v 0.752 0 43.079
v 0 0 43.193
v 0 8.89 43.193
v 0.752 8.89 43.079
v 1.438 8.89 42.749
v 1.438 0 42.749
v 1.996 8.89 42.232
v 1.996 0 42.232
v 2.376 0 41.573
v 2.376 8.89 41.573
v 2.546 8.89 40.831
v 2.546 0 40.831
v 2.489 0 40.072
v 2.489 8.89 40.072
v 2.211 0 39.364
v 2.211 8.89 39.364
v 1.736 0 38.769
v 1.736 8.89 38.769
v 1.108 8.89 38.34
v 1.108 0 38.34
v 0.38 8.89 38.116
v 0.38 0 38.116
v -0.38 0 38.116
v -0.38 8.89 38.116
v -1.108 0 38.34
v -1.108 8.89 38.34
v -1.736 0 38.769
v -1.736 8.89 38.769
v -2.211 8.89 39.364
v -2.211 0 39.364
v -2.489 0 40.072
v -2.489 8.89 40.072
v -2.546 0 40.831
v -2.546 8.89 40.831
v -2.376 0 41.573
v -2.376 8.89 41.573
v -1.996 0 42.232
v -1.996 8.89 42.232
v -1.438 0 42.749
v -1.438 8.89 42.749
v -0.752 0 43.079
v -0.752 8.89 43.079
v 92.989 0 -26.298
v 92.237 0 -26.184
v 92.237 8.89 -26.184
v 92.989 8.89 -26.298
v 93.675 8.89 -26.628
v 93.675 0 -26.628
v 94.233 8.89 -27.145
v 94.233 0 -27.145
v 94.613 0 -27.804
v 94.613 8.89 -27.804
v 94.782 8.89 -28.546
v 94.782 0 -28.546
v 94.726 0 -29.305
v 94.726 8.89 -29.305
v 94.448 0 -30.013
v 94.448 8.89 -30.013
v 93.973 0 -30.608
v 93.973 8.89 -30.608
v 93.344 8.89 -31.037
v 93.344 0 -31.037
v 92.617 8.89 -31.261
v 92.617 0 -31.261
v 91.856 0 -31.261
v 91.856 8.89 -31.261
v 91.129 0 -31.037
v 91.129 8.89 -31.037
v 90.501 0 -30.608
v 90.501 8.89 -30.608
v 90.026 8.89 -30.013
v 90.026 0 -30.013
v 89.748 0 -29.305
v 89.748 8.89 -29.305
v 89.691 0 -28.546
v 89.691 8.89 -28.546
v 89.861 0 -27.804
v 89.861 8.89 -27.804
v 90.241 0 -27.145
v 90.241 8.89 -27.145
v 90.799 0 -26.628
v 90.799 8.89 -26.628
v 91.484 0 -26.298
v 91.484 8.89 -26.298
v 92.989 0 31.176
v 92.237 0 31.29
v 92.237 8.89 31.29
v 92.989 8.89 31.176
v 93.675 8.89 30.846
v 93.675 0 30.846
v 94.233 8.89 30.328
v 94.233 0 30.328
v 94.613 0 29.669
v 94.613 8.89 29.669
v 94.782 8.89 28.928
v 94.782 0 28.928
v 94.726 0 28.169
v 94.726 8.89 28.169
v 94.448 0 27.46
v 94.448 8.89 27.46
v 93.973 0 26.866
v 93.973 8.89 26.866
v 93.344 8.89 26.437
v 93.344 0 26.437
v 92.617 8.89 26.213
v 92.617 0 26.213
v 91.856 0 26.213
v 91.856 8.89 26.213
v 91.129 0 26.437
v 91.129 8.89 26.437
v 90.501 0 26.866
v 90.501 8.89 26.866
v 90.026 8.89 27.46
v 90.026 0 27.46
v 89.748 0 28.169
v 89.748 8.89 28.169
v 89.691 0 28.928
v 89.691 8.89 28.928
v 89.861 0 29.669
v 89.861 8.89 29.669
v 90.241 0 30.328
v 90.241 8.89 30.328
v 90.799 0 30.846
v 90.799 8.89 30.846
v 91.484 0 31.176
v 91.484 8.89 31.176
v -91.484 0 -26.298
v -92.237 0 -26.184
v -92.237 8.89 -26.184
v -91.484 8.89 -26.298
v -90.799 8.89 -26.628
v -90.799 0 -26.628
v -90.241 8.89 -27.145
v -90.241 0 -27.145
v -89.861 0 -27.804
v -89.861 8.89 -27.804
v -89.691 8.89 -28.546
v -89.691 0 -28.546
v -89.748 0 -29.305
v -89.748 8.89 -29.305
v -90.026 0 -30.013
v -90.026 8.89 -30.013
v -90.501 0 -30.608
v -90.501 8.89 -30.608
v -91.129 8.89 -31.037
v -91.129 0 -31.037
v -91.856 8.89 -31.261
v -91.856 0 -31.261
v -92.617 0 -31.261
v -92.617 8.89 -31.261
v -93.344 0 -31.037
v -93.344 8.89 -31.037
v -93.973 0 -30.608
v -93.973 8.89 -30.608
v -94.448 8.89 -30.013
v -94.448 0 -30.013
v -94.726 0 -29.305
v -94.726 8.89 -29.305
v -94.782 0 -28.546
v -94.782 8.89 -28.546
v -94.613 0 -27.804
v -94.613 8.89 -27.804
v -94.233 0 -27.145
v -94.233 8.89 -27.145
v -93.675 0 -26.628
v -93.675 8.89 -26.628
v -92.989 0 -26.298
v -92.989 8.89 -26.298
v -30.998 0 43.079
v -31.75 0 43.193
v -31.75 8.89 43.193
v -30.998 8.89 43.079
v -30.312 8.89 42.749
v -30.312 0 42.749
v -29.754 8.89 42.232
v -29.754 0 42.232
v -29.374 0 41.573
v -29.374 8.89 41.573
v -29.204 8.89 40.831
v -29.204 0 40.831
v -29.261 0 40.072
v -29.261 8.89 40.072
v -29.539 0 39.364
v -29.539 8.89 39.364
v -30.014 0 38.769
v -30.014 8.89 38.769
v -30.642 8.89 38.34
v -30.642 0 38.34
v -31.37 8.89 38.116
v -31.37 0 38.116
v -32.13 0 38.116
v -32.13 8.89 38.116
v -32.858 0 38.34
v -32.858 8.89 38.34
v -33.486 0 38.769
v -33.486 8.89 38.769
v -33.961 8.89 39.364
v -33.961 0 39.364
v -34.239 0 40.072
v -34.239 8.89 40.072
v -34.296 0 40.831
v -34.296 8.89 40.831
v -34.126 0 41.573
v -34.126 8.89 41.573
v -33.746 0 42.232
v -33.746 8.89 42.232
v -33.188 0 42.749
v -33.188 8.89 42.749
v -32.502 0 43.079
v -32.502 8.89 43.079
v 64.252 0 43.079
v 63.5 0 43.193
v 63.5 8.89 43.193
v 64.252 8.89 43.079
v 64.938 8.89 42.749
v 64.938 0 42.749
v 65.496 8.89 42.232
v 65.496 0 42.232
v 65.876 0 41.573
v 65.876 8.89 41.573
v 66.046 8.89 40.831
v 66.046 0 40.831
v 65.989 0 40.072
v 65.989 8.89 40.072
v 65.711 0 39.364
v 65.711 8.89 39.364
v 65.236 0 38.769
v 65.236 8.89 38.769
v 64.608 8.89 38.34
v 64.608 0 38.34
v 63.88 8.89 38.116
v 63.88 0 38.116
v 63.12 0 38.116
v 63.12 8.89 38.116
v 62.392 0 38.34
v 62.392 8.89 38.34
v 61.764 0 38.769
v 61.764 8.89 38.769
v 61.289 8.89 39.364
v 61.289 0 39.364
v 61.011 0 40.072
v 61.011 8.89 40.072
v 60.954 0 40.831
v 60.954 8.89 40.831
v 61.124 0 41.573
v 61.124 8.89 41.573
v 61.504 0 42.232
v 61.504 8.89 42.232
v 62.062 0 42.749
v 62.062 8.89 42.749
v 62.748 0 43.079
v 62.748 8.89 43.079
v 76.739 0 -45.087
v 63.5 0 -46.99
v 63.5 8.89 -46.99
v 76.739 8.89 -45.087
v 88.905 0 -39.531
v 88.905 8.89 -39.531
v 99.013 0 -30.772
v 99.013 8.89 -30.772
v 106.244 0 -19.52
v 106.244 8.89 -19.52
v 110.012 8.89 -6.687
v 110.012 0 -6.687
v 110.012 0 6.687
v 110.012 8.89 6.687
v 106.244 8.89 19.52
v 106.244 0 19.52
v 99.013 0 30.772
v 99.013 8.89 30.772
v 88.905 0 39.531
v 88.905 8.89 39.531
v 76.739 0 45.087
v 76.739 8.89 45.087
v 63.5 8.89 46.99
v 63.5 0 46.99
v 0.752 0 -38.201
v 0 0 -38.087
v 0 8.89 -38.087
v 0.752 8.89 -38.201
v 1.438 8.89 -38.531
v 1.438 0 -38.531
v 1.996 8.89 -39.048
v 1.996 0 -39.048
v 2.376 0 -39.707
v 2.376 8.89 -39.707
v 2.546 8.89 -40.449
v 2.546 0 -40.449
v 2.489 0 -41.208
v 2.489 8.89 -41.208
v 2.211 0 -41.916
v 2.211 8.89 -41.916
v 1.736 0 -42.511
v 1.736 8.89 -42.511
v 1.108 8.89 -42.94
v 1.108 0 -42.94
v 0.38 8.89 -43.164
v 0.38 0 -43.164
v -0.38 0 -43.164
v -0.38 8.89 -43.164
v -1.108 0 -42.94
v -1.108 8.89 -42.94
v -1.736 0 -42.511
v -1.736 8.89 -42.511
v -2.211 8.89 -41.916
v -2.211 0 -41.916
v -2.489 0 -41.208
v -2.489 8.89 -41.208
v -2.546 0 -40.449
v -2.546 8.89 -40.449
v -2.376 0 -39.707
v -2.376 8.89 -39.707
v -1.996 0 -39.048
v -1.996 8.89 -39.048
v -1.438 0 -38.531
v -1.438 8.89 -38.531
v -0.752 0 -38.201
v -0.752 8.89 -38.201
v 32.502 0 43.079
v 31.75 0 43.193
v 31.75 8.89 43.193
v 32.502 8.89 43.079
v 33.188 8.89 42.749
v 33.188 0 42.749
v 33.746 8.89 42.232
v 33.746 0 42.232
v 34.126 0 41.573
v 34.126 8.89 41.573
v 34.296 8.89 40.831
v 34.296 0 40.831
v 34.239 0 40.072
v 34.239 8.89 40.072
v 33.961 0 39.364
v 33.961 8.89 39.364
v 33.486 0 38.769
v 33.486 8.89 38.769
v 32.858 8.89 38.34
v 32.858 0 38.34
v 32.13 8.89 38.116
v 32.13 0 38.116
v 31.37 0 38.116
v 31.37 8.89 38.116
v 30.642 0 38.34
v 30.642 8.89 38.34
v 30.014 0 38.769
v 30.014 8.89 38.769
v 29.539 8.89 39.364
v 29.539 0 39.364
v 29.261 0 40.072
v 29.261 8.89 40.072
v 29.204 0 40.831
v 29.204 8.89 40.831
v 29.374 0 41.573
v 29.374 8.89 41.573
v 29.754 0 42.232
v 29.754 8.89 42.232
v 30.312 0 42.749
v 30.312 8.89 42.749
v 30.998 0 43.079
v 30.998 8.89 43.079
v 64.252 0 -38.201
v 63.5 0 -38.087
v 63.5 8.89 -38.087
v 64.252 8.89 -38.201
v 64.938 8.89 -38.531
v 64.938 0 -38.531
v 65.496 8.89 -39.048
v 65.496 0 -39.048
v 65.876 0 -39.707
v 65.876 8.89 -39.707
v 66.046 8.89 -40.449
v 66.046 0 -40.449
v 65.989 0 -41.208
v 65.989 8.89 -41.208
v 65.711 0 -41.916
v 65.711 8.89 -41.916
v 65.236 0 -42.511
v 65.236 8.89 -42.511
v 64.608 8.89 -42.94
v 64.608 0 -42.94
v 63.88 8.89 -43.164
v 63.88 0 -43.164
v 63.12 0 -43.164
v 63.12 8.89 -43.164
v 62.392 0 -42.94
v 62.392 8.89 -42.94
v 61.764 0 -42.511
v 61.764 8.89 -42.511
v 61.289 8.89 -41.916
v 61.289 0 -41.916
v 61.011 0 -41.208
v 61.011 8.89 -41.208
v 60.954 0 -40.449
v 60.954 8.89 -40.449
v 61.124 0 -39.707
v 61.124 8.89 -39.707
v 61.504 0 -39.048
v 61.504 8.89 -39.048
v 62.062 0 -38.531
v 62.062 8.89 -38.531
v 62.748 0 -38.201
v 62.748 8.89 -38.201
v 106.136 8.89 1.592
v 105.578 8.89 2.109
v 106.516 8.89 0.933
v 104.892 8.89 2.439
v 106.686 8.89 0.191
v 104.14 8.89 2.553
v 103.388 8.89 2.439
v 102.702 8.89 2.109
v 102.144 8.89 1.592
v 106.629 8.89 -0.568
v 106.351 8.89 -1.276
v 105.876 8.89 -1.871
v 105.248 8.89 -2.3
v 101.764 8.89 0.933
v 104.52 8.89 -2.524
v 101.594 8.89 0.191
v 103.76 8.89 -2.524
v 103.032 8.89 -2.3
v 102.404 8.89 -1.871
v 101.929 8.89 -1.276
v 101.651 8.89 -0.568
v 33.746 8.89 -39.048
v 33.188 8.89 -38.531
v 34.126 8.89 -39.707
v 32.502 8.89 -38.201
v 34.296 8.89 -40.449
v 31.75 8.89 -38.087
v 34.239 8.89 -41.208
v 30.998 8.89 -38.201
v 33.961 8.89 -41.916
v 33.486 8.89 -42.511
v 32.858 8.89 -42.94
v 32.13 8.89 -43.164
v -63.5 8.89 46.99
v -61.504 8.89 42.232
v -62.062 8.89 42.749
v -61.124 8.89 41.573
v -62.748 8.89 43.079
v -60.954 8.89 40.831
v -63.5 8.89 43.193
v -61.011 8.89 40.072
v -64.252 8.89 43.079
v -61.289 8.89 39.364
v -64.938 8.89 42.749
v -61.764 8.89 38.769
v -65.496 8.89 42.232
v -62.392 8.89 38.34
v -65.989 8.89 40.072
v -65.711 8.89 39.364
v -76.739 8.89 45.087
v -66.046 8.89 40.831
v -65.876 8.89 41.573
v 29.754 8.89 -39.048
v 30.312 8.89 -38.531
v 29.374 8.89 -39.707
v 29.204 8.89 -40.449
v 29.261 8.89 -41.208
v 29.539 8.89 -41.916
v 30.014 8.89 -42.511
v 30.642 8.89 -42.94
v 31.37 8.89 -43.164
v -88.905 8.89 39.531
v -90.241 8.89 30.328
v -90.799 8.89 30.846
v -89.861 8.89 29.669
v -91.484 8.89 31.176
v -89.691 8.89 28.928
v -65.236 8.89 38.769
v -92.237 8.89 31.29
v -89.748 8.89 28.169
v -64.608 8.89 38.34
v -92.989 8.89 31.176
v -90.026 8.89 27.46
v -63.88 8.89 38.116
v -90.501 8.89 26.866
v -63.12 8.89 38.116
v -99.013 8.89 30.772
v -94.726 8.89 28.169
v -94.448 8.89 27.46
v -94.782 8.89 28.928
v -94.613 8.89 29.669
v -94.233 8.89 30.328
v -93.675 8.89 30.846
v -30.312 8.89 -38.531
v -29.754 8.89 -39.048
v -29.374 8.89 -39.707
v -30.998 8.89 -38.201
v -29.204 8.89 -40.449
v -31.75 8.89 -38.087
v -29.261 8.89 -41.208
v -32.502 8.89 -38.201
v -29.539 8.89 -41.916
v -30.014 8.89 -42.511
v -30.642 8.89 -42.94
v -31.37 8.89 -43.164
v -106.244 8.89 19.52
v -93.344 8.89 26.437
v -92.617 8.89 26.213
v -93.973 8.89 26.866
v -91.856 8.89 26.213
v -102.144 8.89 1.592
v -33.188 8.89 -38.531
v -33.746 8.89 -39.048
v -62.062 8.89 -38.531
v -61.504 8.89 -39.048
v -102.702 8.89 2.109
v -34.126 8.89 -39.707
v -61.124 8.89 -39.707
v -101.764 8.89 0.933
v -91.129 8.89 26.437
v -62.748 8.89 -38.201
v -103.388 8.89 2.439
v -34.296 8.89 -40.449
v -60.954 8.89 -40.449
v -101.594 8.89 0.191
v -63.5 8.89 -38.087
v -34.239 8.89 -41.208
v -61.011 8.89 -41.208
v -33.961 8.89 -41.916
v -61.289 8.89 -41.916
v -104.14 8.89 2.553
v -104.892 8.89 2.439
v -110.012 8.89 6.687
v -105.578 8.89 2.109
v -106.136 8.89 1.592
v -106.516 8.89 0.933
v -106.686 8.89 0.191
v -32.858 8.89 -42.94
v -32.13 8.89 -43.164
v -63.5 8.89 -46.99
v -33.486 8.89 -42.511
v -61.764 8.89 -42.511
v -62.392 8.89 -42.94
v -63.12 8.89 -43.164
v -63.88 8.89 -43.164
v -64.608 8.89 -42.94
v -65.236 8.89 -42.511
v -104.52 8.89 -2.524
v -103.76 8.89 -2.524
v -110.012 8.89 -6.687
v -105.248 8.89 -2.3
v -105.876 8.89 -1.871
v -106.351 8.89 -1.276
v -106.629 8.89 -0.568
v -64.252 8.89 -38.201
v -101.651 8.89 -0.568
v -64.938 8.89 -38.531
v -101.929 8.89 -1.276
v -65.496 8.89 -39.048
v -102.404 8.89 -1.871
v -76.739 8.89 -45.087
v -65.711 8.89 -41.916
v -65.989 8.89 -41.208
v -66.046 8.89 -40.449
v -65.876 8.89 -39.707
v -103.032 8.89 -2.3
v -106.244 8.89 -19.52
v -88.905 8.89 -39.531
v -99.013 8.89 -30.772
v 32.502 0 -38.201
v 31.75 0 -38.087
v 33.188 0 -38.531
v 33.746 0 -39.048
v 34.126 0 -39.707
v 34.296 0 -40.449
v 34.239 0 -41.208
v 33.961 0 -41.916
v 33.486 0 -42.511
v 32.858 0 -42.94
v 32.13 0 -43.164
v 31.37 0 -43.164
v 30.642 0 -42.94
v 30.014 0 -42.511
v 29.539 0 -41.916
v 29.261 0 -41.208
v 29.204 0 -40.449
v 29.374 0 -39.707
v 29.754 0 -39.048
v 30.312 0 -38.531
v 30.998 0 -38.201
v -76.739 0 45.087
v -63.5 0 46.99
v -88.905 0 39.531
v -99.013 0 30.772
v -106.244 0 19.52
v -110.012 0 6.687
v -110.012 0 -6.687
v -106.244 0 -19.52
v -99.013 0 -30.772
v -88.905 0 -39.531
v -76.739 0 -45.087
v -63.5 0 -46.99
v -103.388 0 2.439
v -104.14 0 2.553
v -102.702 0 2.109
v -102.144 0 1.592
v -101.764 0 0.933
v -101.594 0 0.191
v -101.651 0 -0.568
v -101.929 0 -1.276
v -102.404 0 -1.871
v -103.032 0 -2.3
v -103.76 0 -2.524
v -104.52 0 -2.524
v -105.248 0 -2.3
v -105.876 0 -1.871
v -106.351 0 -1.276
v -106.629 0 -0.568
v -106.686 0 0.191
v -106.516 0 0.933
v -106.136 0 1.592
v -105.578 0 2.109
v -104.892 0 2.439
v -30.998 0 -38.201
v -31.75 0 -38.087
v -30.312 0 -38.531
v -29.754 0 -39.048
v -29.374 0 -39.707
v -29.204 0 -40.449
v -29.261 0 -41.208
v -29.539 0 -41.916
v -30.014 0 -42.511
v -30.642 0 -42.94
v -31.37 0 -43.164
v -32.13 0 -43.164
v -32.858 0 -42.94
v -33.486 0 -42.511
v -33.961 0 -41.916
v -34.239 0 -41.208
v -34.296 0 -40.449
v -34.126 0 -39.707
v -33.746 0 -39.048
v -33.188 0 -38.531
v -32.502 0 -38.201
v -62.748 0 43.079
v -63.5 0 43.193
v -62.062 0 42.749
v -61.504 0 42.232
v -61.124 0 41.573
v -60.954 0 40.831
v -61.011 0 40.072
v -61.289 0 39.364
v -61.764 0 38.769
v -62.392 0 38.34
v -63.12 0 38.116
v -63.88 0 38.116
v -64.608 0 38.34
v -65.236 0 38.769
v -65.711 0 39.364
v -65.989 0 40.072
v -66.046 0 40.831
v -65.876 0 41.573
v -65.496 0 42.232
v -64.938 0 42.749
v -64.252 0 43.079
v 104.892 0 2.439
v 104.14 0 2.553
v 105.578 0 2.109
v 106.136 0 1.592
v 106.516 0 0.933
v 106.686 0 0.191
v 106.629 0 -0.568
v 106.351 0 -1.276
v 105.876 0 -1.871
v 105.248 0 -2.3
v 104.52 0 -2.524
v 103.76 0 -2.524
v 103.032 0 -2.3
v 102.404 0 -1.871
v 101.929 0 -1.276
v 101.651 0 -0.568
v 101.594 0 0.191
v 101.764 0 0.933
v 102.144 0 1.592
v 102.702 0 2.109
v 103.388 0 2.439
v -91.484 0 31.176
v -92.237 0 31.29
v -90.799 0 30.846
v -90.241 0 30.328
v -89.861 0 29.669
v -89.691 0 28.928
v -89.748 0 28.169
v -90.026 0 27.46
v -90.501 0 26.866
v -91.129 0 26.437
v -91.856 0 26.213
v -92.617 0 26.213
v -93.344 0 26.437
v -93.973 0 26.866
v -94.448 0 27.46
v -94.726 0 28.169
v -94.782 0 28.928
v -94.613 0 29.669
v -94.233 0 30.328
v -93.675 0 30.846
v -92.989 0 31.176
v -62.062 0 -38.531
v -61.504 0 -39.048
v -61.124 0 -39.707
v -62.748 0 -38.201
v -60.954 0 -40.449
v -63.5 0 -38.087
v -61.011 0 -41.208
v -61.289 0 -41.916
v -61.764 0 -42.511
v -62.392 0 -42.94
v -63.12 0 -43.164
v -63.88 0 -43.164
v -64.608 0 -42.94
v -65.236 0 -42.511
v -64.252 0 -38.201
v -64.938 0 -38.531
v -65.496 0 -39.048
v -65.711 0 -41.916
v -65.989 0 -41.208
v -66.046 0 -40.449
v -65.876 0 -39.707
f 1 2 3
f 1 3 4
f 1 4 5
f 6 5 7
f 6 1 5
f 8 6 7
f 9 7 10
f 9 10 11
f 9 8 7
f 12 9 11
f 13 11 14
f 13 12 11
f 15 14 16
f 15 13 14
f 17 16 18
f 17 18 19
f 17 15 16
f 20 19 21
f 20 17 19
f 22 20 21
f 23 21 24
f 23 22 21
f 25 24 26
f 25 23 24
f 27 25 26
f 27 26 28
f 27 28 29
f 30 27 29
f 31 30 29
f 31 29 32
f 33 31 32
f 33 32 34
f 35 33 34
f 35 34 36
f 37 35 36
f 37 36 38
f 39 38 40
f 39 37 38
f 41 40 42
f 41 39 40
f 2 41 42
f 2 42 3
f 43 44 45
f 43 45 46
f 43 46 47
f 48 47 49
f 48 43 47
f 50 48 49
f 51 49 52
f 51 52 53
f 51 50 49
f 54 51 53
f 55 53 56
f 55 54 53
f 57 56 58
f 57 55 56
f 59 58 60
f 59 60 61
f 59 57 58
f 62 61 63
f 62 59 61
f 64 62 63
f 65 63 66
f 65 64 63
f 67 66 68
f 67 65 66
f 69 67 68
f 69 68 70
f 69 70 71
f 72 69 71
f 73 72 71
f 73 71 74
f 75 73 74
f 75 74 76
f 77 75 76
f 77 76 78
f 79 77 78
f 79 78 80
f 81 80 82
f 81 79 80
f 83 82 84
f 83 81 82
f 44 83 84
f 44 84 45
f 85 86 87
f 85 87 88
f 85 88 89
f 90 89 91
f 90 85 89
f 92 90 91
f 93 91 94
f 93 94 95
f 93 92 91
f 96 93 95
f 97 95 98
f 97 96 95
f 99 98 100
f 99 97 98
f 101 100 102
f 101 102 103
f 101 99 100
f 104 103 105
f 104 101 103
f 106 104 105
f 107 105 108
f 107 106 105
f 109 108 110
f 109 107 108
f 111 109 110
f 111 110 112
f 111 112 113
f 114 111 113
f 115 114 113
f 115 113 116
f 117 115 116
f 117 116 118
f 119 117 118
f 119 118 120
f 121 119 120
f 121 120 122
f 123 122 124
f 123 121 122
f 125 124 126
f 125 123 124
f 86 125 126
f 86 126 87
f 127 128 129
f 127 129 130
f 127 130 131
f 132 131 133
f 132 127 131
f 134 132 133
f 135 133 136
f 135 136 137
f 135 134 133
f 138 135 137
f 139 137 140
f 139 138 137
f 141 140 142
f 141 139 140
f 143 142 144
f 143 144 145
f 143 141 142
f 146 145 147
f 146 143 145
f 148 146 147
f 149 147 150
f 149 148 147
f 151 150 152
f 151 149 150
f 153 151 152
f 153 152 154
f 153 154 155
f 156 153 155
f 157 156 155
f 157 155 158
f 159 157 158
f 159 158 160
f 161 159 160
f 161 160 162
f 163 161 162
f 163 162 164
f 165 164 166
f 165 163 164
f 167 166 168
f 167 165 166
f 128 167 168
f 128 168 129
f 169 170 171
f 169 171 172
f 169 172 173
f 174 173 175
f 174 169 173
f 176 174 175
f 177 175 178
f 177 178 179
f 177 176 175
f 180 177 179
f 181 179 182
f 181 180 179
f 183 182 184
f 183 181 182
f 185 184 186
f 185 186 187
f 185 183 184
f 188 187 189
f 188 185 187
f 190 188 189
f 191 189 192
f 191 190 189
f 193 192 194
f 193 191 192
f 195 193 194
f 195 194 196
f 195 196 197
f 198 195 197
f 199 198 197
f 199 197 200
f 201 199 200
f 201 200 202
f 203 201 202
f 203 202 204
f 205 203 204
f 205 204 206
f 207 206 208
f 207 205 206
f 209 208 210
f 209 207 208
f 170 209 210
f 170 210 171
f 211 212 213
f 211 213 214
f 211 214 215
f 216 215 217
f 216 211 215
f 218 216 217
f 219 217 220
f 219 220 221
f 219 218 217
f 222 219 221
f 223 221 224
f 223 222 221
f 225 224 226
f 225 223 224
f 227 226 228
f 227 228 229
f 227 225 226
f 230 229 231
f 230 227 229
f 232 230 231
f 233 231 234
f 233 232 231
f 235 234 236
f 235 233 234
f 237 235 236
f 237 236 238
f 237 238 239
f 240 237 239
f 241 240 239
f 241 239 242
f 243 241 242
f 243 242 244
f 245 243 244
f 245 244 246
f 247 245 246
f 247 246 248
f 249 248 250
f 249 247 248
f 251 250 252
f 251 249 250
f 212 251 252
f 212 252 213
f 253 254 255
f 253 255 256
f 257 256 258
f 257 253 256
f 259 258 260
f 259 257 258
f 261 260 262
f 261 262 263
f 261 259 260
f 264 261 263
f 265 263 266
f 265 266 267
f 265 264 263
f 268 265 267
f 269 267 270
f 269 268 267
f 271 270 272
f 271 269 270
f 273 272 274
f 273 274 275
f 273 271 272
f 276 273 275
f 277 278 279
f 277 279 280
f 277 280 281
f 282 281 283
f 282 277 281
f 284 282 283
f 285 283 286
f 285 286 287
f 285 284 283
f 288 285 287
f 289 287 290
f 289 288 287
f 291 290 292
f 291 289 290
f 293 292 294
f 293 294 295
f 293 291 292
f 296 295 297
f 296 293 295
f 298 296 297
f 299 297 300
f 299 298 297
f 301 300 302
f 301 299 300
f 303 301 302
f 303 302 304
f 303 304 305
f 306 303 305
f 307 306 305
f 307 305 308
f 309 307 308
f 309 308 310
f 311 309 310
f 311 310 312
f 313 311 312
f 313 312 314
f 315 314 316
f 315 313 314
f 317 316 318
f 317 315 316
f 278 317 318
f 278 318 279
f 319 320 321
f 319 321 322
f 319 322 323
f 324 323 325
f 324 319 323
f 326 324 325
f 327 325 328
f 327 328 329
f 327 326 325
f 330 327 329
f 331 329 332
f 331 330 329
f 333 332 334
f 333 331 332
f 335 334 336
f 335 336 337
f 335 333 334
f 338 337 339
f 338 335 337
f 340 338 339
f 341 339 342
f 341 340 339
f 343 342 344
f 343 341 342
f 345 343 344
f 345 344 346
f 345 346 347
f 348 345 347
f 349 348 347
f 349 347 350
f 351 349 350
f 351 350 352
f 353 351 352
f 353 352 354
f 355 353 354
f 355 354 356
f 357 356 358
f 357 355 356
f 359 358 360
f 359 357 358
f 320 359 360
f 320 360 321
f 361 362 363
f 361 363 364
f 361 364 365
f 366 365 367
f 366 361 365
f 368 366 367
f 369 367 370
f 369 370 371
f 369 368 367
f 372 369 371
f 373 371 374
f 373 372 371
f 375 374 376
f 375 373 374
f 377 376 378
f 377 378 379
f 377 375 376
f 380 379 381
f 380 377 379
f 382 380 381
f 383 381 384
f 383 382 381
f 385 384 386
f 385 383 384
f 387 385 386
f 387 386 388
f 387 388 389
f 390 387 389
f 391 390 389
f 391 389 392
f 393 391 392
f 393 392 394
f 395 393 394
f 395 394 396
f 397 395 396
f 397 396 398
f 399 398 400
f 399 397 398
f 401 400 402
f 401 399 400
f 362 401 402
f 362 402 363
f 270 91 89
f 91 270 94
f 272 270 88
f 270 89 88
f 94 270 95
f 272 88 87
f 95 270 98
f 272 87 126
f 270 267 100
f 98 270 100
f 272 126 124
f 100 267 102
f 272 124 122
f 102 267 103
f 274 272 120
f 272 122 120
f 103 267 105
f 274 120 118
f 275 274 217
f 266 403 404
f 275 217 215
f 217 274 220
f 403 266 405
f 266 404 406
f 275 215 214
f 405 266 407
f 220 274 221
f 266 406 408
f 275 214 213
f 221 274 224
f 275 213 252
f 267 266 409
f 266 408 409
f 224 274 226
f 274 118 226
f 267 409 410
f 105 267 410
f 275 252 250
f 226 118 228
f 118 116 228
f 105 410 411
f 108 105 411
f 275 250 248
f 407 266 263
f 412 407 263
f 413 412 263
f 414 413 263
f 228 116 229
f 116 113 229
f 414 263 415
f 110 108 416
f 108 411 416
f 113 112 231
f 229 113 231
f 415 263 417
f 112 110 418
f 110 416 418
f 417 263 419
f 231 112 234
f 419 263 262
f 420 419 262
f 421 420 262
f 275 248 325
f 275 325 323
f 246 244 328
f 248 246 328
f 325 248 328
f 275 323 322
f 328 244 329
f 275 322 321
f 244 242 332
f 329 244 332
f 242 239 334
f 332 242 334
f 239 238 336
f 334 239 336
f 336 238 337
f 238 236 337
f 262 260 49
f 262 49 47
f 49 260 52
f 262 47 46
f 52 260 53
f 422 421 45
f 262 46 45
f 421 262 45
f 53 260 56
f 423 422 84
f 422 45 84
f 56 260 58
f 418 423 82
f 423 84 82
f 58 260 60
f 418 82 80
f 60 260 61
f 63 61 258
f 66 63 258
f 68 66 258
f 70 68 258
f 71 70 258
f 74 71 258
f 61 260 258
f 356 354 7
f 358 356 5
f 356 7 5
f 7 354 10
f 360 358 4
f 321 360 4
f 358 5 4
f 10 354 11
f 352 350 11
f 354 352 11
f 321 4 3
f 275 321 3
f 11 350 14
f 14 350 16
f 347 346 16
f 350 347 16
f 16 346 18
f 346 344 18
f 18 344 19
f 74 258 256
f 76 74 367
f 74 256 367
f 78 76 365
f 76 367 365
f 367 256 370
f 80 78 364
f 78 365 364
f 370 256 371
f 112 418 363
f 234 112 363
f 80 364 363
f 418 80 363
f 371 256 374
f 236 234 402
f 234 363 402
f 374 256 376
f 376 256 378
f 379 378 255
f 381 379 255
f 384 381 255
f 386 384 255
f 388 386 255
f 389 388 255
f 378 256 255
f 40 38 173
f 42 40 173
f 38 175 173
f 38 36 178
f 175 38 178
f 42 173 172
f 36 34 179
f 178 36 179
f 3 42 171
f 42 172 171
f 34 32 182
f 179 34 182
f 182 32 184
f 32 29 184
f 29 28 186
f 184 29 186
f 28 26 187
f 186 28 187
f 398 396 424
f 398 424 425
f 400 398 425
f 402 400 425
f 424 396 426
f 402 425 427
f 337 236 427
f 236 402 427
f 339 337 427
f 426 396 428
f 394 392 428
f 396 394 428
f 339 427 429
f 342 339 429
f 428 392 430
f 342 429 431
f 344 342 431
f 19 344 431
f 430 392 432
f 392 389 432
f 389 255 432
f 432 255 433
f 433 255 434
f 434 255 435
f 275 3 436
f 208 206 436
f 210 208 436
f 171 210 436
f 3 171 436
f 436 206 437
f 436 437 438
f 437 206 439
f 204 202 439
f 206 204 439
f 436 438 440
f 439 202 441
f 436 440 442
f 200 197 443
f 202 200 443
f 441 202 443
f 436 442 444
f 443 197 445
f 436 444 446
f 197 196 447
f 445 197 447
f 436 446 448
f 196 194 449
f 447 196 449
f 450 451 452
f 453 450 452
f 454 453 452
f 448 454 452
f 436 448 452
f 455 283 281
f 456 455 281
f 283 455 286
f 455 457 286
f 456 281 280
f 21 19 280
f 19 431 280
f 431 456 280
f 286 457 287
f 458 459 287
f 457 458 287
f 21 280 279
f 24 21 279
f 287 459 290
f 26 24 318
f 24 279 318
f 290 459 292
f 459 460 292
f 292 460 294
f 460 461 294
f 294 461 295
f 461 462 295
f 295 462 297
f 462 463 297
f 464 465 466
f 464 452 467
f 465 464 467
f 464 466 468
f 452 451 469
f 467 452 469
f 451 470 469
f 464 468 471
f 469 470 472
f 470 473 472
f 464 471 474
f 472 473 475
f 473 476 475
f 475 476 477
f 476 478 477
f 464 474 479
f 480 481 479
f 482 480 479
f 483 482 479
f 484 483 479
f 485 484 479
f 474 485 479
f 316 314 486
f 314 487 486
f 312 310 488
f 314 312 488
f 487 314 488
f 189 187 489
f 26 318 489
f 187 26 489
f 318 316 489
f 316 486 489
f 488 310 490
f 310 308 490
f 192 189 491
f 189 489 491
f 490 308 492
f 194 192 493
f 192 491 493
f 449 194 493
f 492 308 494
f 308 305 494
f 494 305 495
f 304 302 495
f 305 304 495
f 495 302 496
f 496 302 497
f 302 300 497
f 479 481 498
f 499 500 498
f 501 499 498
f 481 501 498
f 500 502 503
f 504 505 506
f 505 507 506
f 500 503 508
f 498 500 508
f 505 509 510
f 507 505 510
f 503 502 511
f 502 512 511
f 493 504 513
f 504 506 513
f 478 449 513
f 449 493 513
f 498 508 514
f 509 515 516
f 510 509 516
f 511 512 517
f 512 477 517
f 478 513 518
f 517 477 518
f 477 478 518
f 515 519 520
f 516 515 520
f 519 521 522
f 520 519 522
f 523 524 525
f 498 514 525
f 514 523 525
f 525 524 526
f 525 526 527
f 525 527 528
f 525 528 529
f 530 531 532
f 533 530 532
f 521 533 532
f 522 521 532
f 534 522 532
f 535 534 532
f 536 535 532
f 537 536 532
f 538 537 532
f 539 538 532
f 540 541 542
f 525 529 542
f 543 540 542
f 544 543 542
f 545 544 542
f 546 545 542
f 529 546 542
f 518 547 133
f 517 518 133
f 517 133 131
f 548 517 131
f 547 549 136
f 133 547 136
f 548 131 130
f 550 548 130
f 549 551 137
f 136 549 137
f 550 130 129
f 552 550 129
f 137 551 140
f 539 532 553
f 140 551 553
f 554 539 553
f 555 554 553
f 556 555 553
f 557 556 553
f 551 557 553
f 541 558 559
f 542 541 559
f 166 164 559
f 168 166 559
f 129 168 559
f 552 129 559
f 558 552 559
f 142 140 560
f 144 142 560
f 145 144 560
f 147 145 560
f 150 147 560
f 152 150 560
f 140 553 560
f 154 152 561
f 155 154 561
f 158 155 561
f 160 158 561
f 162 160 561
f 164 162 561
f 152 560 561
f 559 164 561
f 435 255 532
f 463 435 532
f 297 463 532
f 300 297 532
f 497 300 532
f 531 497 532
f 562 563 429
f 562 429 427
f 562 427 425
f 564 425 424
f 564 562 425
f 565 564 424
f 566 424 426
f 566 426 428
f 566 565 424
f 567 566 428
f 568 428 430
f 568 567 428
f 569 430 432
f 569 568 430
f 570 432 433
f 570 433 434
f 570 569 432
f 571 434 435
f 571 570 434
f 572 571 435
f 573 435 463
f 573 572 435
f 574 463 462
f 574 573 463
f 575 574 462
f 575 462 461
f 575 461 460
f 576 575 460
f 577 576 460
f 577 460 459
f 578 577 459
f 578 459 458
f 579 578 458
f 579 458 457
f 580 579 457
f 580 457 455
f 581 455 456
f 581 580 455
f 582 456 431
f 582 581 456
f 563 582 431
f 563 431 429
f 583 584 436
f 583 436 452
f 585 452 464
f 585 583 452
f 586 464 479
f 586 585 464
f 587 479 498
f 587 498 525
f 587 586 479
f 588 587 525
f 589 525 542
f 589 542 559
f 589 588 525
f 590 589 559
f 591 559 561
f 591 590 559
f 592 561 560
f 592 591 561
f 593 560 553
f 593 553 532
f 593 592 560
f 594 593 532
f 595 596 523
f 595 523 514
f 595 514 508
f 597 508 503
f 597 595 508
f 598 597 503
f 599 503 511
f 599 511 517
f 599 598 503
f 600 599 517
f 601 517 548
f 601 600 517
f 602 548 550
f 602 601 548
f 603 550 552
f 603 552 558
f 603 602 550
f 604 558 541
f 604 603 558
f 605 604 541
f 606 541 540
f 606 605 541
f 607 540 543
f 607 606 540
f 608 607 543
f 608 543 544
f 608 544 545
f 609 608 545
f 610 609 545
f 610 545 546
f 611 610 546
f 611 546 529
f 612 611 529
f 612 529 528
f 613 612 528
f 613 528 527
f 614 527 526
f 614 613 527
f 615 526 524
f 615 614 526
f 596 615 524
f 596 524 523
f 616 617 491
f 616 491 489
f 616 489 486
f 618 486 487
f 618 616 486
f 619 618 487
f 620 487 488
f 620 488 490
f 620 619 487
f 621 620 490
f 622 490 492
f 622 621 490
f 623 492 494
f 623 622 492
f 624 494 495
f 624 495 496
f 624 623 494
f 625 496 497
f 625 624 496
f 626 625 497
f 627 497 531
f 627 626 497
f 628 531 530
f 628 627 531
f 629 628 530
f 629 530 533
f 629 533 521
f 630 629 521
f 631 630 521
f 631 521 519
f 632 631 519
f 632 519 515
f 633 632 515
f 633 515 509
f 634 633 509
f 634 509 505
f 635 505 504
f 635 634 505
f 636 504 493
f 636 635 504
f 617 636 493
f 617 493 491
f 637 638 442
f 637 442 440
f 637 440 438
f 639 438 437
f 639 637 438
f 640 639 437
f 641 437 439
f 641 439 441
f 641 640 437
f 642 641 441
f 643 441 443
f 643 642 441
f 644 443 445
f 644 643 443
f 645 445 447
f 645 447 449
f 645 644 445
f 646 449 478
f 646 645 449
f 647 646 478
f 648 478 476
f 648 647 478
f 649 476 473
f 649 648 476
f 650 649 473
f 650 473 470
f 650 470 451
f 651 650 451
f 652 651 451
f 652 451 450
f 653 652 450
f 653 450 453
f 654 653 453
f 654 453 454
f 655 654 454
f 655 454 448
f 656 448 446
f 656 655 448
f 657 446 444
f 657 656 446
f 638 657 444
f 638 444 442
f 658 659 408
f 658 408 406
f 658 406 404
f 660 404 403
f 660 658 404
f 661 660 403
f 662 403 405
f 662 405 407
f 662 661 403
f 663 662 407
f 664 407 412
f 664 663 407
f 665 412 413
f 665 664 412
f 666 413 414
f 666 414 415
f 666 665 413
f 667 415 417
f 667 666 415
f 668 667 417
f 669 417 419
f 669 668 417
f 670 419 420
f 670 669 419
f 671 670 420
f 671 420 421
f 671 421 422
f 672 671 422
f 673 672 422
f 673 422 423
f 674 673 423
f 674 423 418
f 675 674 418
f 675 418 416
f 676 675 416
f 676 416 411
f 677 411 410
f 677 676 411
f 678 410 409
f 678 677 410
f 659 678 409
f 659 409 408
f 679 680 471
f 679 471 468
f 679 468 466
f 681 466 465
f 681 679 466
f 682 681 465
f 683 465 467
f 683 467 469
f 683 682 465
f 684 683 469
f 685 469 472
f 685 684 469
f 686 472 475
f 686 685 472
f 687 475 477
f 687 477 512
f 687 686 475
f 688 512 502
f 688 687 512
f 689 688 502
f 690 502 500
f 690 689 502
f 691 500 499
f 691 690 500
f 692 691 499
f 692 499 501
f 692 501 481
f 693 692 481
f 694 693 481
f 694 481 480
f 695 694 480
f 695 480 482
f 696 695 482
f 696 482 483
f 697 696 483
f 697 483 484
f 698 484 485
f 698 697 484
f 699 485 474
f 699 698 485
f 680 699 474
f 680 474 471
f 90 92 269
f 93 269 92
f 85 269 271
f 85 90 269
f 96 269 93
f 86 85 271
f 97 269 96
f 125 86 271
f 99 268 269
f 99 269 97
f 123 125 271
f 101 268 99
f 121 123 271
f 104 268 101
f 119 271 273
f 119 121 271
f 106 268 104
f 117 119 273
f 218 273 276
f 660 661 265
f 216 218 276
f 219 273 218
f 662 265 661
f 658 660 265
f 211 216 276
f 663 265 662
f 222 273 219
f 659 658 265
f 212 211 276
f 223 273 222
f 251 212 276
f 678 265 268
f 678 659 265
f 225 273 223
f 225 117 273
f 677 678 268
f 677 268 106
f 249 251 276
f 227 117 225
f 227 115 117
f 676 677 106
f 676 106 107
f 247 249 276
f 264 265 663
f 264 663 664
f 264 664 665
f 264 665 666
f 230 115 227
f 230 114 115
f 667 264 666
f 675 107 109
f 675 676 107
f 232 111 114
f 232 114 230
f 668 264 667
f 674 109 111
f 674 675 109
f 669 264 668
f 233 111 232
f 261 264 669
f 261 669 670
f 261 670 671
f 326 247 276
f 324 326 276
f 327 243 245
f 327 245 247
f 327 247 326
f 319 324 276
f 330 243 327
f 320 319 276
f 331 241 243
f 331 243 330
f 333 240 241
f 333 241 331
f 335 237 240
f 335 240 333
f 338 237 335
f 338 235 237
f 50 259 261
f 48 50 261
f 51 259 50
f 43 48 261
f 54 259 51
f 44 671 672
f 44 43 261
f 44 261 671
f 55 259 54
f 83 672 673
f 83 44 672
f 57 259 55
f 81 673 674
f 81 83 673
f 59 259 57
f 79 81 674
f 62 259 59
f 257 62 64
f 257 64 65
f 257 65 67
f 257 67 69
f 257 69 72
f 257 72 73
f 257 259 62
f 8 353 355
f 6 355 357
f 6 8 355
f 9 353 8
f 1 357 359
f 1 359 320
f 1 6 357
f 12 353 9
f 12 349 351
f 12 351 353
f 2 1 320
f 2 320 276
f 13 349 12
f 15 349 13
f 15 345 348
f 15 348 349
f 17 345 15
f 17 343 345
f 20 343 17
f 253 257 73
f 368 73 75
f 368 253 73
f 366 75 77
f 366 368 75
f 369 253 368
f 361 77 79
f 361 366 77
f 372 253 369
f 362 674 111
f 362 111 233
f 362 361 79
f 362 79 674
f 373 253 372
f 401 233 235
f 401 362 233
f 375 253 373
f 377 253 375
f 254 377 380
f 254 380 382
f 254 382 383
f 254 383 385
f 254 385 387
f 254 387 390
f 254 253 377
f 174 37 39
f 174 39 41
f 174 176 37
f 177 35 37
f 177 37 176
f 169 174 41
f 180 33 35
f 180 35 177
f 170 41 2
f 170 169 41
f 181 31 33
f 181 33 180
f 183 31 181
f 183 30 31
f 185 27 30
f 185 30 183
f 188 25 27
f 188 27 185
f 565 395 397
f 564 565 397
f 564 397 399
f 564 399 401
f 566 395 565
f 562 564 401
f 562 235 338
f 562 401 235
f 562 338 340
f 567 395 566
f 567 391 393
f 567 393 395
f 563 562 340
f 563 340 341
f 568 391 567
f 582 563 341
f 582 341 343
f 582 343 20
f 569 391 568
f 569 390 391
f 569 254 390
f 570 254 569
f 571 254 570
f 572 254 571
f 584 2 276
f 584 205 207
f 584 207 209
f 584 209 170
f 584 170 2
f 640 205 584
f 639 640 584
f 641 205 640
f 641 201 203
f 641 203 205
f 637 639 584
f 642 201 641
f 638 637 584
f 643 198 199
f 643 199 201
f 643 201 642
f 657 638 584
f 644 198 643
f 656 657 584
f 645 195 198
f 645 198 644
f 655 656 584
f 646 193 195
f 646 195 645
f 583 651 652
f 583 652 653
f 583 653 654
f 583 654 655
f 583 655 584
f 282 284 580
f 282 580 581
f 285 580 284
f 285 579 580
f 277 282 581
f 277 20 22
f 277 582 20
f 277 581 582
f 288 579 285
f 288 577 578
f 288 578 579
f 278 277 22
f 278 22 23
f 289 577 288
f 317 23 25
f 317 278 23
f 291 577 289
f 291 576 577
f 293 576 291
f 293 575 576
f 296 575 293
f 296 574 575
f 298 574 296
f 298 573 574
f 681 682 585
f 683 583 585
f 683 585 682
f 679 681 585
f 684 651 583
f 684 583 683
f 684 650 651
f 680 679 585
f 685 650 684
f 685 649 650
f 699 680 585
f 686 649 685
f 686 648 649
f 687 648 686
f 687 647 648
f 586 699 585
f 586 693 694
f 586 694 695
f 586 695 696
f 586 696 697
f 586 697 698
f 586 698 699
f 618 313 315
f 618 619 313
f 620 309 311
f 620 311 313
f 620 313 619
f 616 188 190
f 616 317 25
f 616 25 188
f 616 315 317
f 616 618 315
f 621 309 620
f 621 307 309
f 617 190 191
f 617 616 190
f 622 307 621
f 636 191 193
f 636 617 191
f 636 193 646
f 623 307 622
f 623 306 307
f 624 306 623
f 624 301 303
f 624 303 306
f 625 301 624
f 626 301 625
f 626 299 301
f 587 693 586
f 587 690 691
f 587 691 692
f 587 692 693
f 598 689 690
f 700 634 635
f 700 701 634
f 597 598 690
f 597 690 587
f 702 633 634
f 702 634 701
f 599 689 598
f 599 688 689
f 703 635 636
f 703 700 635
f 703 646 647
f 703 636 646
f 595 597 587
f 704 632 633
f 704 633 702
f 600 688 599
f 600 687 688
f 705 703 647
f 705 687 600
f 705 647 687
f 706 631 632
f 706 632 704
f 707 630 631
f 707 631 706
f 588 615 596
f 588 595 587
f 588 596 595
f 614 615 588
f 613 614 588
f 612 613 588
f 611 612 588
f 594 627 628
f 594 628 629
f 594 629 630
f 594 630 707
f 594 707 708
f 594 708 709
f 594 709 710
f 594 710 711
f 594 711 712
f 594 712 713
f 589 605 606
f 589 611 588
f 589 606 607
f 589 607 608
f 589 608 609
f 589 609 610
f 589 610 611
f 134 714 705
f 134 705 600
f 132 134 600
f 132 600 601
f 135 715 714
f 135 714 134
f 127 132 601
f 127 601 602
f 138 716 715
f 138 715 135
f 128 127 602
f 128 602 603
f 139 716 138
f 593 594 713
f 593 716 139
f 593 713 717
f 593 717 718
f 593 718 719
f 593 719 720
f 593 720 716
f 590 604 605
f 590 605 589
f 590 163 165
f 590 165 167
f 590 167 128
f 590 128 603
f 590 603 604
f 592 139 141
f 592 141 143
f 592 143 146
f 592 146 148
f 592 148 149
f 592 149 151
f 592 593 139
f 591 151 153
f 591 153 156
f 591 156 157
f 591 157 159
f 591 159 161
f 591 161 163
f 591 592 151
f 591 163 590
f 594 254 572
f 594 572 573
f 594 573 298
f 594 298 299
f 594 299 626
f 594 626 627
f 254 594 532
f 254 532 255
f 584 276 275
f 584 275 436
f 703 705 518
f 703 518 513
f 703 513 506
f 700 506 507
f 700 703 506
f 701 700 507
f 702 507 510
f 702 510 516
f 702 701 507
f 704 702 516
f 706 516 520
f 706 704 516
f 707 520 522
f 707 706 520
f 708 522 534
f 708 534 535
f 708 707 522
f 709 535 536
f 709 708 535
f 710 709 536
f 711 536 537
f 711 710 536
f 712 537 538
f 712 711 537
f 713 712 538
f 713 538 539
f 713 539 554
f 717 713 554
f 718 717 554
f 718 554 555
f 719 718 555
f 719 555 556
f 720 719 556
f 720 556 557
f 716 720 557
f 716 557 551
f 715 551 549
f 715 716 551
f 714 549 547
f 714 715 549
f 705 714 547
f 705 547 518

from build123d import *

# Parameters (mm, degrees)
SKETCH1_R           = 2.5527
BOSS_EXTRUDE1_DEPTH = 8.89


with BuildPart() as part:
    # Sketch1 → Boss-Extrude1 (new body)
    with BuildSketch(Plane(origin=(0, 0, 0), x_dir=(1, 0, 0), z_dir=(0, 1, 0))):
        with BuildLine():
            Line((-63.5, 46.99), (63.5, 46.99))
            ThreePointArc((63.5, 46.99), (110.49, 0), (63.5, -46.99))
            Line((63.5, -46.99), (-63.5, -46.99))
            ThreePointArc((-63.5, -46.99), (-110.49, 0), (-63.5, 46.99))
        make_face()
        with Locations(Location((-63.5, 40.64, 0), (0, 0, 270))):
            Circle(SKETCH1_R, mode=Mode.SUBTRACT)
        with Locations(Location((-31.75, 40.64, 0), (0, 0, 270))):
            Circle(SKETCH1_R, mode=Mode.SUBTRACT)
        with Locations(Location((0, 40.64, 0), (0, 0, 270))):
            Circle(SKETCH1_R, mode=Mode.SUBTRACT)
        with Locations(Location((31.75, 40.64, 0), (0, 0, 270))):
            Circle(SKETCH1_R, mode=Mode.SUBTRACT)
        with Locations(Location((63.5, 40.64, 0), (0, 0, 270))):
            Circle(SKETCH1_R, mode=Mode.SUBTRACT)
        with Locations(Location((92.236819587, 28.736819587, 0), (0, 0, 270))):
            Circle(SKETCH1_R, mode=Mode.SUBTRACT)
        with Locations(Location((104.14, 0, 0), (0, 0, 270))):
            Circle(SKETCH1_R, mode=Mode.SUBTRACT)
        with Locations(Location((92.236819587, -28.736819587, 0), (0, 0, 270))):
            Circle(SKETCH1_R, mode=Mode.SUBTRACT)
        with Locations(Location((63.5, -40.64, 0), (0, 0, 270))):
            Circle(SKETCH1_R, mode=Mode.SUBTRACT)
        with Locations(Location((-92.236819587, 28.736819587, 0), (0, 0, 270))):
            Circle(SKETCH1_R, mode=Mode.SUBTRACT)
        with Locations(Location((-104.14, 0, 0), (0, 0, 270))):
            Circle(SKETCH1_R, mode=Mode.SUBTRACT)
        with Locations(Location((-92.236819587, -28.736819587, 0), (0, 0, 270))):
            Circle(SKETCH1_R, mode=Mode.SUBTRACT)
        with Locations(Location((-63.5, -40.64, 0), (0, 0, 270))):
            Circle(SKETCH1_R, mode=Mode.SUBTRACT)
        with Locations(Location((31.75, -40.64, 0), (0, 0, 270))):
            Circle(SKETCH1_R, mode=Mode.SUBTRACT)
        with Locations(Location((0, -40.64, 0), (0, 0, 270))):
            Circle(SKETCH1_R, mode=Mode.SUBTRACT)
        with Locations(Location((-31.75, -40.64, 0), (0, 0, 270))):
            Circle(SKETCH1_R, mode=Mode.SUBTRACT)
    extrude(amount=BOSS_EXTRUDE1_DEPTH)


solid = part.part
